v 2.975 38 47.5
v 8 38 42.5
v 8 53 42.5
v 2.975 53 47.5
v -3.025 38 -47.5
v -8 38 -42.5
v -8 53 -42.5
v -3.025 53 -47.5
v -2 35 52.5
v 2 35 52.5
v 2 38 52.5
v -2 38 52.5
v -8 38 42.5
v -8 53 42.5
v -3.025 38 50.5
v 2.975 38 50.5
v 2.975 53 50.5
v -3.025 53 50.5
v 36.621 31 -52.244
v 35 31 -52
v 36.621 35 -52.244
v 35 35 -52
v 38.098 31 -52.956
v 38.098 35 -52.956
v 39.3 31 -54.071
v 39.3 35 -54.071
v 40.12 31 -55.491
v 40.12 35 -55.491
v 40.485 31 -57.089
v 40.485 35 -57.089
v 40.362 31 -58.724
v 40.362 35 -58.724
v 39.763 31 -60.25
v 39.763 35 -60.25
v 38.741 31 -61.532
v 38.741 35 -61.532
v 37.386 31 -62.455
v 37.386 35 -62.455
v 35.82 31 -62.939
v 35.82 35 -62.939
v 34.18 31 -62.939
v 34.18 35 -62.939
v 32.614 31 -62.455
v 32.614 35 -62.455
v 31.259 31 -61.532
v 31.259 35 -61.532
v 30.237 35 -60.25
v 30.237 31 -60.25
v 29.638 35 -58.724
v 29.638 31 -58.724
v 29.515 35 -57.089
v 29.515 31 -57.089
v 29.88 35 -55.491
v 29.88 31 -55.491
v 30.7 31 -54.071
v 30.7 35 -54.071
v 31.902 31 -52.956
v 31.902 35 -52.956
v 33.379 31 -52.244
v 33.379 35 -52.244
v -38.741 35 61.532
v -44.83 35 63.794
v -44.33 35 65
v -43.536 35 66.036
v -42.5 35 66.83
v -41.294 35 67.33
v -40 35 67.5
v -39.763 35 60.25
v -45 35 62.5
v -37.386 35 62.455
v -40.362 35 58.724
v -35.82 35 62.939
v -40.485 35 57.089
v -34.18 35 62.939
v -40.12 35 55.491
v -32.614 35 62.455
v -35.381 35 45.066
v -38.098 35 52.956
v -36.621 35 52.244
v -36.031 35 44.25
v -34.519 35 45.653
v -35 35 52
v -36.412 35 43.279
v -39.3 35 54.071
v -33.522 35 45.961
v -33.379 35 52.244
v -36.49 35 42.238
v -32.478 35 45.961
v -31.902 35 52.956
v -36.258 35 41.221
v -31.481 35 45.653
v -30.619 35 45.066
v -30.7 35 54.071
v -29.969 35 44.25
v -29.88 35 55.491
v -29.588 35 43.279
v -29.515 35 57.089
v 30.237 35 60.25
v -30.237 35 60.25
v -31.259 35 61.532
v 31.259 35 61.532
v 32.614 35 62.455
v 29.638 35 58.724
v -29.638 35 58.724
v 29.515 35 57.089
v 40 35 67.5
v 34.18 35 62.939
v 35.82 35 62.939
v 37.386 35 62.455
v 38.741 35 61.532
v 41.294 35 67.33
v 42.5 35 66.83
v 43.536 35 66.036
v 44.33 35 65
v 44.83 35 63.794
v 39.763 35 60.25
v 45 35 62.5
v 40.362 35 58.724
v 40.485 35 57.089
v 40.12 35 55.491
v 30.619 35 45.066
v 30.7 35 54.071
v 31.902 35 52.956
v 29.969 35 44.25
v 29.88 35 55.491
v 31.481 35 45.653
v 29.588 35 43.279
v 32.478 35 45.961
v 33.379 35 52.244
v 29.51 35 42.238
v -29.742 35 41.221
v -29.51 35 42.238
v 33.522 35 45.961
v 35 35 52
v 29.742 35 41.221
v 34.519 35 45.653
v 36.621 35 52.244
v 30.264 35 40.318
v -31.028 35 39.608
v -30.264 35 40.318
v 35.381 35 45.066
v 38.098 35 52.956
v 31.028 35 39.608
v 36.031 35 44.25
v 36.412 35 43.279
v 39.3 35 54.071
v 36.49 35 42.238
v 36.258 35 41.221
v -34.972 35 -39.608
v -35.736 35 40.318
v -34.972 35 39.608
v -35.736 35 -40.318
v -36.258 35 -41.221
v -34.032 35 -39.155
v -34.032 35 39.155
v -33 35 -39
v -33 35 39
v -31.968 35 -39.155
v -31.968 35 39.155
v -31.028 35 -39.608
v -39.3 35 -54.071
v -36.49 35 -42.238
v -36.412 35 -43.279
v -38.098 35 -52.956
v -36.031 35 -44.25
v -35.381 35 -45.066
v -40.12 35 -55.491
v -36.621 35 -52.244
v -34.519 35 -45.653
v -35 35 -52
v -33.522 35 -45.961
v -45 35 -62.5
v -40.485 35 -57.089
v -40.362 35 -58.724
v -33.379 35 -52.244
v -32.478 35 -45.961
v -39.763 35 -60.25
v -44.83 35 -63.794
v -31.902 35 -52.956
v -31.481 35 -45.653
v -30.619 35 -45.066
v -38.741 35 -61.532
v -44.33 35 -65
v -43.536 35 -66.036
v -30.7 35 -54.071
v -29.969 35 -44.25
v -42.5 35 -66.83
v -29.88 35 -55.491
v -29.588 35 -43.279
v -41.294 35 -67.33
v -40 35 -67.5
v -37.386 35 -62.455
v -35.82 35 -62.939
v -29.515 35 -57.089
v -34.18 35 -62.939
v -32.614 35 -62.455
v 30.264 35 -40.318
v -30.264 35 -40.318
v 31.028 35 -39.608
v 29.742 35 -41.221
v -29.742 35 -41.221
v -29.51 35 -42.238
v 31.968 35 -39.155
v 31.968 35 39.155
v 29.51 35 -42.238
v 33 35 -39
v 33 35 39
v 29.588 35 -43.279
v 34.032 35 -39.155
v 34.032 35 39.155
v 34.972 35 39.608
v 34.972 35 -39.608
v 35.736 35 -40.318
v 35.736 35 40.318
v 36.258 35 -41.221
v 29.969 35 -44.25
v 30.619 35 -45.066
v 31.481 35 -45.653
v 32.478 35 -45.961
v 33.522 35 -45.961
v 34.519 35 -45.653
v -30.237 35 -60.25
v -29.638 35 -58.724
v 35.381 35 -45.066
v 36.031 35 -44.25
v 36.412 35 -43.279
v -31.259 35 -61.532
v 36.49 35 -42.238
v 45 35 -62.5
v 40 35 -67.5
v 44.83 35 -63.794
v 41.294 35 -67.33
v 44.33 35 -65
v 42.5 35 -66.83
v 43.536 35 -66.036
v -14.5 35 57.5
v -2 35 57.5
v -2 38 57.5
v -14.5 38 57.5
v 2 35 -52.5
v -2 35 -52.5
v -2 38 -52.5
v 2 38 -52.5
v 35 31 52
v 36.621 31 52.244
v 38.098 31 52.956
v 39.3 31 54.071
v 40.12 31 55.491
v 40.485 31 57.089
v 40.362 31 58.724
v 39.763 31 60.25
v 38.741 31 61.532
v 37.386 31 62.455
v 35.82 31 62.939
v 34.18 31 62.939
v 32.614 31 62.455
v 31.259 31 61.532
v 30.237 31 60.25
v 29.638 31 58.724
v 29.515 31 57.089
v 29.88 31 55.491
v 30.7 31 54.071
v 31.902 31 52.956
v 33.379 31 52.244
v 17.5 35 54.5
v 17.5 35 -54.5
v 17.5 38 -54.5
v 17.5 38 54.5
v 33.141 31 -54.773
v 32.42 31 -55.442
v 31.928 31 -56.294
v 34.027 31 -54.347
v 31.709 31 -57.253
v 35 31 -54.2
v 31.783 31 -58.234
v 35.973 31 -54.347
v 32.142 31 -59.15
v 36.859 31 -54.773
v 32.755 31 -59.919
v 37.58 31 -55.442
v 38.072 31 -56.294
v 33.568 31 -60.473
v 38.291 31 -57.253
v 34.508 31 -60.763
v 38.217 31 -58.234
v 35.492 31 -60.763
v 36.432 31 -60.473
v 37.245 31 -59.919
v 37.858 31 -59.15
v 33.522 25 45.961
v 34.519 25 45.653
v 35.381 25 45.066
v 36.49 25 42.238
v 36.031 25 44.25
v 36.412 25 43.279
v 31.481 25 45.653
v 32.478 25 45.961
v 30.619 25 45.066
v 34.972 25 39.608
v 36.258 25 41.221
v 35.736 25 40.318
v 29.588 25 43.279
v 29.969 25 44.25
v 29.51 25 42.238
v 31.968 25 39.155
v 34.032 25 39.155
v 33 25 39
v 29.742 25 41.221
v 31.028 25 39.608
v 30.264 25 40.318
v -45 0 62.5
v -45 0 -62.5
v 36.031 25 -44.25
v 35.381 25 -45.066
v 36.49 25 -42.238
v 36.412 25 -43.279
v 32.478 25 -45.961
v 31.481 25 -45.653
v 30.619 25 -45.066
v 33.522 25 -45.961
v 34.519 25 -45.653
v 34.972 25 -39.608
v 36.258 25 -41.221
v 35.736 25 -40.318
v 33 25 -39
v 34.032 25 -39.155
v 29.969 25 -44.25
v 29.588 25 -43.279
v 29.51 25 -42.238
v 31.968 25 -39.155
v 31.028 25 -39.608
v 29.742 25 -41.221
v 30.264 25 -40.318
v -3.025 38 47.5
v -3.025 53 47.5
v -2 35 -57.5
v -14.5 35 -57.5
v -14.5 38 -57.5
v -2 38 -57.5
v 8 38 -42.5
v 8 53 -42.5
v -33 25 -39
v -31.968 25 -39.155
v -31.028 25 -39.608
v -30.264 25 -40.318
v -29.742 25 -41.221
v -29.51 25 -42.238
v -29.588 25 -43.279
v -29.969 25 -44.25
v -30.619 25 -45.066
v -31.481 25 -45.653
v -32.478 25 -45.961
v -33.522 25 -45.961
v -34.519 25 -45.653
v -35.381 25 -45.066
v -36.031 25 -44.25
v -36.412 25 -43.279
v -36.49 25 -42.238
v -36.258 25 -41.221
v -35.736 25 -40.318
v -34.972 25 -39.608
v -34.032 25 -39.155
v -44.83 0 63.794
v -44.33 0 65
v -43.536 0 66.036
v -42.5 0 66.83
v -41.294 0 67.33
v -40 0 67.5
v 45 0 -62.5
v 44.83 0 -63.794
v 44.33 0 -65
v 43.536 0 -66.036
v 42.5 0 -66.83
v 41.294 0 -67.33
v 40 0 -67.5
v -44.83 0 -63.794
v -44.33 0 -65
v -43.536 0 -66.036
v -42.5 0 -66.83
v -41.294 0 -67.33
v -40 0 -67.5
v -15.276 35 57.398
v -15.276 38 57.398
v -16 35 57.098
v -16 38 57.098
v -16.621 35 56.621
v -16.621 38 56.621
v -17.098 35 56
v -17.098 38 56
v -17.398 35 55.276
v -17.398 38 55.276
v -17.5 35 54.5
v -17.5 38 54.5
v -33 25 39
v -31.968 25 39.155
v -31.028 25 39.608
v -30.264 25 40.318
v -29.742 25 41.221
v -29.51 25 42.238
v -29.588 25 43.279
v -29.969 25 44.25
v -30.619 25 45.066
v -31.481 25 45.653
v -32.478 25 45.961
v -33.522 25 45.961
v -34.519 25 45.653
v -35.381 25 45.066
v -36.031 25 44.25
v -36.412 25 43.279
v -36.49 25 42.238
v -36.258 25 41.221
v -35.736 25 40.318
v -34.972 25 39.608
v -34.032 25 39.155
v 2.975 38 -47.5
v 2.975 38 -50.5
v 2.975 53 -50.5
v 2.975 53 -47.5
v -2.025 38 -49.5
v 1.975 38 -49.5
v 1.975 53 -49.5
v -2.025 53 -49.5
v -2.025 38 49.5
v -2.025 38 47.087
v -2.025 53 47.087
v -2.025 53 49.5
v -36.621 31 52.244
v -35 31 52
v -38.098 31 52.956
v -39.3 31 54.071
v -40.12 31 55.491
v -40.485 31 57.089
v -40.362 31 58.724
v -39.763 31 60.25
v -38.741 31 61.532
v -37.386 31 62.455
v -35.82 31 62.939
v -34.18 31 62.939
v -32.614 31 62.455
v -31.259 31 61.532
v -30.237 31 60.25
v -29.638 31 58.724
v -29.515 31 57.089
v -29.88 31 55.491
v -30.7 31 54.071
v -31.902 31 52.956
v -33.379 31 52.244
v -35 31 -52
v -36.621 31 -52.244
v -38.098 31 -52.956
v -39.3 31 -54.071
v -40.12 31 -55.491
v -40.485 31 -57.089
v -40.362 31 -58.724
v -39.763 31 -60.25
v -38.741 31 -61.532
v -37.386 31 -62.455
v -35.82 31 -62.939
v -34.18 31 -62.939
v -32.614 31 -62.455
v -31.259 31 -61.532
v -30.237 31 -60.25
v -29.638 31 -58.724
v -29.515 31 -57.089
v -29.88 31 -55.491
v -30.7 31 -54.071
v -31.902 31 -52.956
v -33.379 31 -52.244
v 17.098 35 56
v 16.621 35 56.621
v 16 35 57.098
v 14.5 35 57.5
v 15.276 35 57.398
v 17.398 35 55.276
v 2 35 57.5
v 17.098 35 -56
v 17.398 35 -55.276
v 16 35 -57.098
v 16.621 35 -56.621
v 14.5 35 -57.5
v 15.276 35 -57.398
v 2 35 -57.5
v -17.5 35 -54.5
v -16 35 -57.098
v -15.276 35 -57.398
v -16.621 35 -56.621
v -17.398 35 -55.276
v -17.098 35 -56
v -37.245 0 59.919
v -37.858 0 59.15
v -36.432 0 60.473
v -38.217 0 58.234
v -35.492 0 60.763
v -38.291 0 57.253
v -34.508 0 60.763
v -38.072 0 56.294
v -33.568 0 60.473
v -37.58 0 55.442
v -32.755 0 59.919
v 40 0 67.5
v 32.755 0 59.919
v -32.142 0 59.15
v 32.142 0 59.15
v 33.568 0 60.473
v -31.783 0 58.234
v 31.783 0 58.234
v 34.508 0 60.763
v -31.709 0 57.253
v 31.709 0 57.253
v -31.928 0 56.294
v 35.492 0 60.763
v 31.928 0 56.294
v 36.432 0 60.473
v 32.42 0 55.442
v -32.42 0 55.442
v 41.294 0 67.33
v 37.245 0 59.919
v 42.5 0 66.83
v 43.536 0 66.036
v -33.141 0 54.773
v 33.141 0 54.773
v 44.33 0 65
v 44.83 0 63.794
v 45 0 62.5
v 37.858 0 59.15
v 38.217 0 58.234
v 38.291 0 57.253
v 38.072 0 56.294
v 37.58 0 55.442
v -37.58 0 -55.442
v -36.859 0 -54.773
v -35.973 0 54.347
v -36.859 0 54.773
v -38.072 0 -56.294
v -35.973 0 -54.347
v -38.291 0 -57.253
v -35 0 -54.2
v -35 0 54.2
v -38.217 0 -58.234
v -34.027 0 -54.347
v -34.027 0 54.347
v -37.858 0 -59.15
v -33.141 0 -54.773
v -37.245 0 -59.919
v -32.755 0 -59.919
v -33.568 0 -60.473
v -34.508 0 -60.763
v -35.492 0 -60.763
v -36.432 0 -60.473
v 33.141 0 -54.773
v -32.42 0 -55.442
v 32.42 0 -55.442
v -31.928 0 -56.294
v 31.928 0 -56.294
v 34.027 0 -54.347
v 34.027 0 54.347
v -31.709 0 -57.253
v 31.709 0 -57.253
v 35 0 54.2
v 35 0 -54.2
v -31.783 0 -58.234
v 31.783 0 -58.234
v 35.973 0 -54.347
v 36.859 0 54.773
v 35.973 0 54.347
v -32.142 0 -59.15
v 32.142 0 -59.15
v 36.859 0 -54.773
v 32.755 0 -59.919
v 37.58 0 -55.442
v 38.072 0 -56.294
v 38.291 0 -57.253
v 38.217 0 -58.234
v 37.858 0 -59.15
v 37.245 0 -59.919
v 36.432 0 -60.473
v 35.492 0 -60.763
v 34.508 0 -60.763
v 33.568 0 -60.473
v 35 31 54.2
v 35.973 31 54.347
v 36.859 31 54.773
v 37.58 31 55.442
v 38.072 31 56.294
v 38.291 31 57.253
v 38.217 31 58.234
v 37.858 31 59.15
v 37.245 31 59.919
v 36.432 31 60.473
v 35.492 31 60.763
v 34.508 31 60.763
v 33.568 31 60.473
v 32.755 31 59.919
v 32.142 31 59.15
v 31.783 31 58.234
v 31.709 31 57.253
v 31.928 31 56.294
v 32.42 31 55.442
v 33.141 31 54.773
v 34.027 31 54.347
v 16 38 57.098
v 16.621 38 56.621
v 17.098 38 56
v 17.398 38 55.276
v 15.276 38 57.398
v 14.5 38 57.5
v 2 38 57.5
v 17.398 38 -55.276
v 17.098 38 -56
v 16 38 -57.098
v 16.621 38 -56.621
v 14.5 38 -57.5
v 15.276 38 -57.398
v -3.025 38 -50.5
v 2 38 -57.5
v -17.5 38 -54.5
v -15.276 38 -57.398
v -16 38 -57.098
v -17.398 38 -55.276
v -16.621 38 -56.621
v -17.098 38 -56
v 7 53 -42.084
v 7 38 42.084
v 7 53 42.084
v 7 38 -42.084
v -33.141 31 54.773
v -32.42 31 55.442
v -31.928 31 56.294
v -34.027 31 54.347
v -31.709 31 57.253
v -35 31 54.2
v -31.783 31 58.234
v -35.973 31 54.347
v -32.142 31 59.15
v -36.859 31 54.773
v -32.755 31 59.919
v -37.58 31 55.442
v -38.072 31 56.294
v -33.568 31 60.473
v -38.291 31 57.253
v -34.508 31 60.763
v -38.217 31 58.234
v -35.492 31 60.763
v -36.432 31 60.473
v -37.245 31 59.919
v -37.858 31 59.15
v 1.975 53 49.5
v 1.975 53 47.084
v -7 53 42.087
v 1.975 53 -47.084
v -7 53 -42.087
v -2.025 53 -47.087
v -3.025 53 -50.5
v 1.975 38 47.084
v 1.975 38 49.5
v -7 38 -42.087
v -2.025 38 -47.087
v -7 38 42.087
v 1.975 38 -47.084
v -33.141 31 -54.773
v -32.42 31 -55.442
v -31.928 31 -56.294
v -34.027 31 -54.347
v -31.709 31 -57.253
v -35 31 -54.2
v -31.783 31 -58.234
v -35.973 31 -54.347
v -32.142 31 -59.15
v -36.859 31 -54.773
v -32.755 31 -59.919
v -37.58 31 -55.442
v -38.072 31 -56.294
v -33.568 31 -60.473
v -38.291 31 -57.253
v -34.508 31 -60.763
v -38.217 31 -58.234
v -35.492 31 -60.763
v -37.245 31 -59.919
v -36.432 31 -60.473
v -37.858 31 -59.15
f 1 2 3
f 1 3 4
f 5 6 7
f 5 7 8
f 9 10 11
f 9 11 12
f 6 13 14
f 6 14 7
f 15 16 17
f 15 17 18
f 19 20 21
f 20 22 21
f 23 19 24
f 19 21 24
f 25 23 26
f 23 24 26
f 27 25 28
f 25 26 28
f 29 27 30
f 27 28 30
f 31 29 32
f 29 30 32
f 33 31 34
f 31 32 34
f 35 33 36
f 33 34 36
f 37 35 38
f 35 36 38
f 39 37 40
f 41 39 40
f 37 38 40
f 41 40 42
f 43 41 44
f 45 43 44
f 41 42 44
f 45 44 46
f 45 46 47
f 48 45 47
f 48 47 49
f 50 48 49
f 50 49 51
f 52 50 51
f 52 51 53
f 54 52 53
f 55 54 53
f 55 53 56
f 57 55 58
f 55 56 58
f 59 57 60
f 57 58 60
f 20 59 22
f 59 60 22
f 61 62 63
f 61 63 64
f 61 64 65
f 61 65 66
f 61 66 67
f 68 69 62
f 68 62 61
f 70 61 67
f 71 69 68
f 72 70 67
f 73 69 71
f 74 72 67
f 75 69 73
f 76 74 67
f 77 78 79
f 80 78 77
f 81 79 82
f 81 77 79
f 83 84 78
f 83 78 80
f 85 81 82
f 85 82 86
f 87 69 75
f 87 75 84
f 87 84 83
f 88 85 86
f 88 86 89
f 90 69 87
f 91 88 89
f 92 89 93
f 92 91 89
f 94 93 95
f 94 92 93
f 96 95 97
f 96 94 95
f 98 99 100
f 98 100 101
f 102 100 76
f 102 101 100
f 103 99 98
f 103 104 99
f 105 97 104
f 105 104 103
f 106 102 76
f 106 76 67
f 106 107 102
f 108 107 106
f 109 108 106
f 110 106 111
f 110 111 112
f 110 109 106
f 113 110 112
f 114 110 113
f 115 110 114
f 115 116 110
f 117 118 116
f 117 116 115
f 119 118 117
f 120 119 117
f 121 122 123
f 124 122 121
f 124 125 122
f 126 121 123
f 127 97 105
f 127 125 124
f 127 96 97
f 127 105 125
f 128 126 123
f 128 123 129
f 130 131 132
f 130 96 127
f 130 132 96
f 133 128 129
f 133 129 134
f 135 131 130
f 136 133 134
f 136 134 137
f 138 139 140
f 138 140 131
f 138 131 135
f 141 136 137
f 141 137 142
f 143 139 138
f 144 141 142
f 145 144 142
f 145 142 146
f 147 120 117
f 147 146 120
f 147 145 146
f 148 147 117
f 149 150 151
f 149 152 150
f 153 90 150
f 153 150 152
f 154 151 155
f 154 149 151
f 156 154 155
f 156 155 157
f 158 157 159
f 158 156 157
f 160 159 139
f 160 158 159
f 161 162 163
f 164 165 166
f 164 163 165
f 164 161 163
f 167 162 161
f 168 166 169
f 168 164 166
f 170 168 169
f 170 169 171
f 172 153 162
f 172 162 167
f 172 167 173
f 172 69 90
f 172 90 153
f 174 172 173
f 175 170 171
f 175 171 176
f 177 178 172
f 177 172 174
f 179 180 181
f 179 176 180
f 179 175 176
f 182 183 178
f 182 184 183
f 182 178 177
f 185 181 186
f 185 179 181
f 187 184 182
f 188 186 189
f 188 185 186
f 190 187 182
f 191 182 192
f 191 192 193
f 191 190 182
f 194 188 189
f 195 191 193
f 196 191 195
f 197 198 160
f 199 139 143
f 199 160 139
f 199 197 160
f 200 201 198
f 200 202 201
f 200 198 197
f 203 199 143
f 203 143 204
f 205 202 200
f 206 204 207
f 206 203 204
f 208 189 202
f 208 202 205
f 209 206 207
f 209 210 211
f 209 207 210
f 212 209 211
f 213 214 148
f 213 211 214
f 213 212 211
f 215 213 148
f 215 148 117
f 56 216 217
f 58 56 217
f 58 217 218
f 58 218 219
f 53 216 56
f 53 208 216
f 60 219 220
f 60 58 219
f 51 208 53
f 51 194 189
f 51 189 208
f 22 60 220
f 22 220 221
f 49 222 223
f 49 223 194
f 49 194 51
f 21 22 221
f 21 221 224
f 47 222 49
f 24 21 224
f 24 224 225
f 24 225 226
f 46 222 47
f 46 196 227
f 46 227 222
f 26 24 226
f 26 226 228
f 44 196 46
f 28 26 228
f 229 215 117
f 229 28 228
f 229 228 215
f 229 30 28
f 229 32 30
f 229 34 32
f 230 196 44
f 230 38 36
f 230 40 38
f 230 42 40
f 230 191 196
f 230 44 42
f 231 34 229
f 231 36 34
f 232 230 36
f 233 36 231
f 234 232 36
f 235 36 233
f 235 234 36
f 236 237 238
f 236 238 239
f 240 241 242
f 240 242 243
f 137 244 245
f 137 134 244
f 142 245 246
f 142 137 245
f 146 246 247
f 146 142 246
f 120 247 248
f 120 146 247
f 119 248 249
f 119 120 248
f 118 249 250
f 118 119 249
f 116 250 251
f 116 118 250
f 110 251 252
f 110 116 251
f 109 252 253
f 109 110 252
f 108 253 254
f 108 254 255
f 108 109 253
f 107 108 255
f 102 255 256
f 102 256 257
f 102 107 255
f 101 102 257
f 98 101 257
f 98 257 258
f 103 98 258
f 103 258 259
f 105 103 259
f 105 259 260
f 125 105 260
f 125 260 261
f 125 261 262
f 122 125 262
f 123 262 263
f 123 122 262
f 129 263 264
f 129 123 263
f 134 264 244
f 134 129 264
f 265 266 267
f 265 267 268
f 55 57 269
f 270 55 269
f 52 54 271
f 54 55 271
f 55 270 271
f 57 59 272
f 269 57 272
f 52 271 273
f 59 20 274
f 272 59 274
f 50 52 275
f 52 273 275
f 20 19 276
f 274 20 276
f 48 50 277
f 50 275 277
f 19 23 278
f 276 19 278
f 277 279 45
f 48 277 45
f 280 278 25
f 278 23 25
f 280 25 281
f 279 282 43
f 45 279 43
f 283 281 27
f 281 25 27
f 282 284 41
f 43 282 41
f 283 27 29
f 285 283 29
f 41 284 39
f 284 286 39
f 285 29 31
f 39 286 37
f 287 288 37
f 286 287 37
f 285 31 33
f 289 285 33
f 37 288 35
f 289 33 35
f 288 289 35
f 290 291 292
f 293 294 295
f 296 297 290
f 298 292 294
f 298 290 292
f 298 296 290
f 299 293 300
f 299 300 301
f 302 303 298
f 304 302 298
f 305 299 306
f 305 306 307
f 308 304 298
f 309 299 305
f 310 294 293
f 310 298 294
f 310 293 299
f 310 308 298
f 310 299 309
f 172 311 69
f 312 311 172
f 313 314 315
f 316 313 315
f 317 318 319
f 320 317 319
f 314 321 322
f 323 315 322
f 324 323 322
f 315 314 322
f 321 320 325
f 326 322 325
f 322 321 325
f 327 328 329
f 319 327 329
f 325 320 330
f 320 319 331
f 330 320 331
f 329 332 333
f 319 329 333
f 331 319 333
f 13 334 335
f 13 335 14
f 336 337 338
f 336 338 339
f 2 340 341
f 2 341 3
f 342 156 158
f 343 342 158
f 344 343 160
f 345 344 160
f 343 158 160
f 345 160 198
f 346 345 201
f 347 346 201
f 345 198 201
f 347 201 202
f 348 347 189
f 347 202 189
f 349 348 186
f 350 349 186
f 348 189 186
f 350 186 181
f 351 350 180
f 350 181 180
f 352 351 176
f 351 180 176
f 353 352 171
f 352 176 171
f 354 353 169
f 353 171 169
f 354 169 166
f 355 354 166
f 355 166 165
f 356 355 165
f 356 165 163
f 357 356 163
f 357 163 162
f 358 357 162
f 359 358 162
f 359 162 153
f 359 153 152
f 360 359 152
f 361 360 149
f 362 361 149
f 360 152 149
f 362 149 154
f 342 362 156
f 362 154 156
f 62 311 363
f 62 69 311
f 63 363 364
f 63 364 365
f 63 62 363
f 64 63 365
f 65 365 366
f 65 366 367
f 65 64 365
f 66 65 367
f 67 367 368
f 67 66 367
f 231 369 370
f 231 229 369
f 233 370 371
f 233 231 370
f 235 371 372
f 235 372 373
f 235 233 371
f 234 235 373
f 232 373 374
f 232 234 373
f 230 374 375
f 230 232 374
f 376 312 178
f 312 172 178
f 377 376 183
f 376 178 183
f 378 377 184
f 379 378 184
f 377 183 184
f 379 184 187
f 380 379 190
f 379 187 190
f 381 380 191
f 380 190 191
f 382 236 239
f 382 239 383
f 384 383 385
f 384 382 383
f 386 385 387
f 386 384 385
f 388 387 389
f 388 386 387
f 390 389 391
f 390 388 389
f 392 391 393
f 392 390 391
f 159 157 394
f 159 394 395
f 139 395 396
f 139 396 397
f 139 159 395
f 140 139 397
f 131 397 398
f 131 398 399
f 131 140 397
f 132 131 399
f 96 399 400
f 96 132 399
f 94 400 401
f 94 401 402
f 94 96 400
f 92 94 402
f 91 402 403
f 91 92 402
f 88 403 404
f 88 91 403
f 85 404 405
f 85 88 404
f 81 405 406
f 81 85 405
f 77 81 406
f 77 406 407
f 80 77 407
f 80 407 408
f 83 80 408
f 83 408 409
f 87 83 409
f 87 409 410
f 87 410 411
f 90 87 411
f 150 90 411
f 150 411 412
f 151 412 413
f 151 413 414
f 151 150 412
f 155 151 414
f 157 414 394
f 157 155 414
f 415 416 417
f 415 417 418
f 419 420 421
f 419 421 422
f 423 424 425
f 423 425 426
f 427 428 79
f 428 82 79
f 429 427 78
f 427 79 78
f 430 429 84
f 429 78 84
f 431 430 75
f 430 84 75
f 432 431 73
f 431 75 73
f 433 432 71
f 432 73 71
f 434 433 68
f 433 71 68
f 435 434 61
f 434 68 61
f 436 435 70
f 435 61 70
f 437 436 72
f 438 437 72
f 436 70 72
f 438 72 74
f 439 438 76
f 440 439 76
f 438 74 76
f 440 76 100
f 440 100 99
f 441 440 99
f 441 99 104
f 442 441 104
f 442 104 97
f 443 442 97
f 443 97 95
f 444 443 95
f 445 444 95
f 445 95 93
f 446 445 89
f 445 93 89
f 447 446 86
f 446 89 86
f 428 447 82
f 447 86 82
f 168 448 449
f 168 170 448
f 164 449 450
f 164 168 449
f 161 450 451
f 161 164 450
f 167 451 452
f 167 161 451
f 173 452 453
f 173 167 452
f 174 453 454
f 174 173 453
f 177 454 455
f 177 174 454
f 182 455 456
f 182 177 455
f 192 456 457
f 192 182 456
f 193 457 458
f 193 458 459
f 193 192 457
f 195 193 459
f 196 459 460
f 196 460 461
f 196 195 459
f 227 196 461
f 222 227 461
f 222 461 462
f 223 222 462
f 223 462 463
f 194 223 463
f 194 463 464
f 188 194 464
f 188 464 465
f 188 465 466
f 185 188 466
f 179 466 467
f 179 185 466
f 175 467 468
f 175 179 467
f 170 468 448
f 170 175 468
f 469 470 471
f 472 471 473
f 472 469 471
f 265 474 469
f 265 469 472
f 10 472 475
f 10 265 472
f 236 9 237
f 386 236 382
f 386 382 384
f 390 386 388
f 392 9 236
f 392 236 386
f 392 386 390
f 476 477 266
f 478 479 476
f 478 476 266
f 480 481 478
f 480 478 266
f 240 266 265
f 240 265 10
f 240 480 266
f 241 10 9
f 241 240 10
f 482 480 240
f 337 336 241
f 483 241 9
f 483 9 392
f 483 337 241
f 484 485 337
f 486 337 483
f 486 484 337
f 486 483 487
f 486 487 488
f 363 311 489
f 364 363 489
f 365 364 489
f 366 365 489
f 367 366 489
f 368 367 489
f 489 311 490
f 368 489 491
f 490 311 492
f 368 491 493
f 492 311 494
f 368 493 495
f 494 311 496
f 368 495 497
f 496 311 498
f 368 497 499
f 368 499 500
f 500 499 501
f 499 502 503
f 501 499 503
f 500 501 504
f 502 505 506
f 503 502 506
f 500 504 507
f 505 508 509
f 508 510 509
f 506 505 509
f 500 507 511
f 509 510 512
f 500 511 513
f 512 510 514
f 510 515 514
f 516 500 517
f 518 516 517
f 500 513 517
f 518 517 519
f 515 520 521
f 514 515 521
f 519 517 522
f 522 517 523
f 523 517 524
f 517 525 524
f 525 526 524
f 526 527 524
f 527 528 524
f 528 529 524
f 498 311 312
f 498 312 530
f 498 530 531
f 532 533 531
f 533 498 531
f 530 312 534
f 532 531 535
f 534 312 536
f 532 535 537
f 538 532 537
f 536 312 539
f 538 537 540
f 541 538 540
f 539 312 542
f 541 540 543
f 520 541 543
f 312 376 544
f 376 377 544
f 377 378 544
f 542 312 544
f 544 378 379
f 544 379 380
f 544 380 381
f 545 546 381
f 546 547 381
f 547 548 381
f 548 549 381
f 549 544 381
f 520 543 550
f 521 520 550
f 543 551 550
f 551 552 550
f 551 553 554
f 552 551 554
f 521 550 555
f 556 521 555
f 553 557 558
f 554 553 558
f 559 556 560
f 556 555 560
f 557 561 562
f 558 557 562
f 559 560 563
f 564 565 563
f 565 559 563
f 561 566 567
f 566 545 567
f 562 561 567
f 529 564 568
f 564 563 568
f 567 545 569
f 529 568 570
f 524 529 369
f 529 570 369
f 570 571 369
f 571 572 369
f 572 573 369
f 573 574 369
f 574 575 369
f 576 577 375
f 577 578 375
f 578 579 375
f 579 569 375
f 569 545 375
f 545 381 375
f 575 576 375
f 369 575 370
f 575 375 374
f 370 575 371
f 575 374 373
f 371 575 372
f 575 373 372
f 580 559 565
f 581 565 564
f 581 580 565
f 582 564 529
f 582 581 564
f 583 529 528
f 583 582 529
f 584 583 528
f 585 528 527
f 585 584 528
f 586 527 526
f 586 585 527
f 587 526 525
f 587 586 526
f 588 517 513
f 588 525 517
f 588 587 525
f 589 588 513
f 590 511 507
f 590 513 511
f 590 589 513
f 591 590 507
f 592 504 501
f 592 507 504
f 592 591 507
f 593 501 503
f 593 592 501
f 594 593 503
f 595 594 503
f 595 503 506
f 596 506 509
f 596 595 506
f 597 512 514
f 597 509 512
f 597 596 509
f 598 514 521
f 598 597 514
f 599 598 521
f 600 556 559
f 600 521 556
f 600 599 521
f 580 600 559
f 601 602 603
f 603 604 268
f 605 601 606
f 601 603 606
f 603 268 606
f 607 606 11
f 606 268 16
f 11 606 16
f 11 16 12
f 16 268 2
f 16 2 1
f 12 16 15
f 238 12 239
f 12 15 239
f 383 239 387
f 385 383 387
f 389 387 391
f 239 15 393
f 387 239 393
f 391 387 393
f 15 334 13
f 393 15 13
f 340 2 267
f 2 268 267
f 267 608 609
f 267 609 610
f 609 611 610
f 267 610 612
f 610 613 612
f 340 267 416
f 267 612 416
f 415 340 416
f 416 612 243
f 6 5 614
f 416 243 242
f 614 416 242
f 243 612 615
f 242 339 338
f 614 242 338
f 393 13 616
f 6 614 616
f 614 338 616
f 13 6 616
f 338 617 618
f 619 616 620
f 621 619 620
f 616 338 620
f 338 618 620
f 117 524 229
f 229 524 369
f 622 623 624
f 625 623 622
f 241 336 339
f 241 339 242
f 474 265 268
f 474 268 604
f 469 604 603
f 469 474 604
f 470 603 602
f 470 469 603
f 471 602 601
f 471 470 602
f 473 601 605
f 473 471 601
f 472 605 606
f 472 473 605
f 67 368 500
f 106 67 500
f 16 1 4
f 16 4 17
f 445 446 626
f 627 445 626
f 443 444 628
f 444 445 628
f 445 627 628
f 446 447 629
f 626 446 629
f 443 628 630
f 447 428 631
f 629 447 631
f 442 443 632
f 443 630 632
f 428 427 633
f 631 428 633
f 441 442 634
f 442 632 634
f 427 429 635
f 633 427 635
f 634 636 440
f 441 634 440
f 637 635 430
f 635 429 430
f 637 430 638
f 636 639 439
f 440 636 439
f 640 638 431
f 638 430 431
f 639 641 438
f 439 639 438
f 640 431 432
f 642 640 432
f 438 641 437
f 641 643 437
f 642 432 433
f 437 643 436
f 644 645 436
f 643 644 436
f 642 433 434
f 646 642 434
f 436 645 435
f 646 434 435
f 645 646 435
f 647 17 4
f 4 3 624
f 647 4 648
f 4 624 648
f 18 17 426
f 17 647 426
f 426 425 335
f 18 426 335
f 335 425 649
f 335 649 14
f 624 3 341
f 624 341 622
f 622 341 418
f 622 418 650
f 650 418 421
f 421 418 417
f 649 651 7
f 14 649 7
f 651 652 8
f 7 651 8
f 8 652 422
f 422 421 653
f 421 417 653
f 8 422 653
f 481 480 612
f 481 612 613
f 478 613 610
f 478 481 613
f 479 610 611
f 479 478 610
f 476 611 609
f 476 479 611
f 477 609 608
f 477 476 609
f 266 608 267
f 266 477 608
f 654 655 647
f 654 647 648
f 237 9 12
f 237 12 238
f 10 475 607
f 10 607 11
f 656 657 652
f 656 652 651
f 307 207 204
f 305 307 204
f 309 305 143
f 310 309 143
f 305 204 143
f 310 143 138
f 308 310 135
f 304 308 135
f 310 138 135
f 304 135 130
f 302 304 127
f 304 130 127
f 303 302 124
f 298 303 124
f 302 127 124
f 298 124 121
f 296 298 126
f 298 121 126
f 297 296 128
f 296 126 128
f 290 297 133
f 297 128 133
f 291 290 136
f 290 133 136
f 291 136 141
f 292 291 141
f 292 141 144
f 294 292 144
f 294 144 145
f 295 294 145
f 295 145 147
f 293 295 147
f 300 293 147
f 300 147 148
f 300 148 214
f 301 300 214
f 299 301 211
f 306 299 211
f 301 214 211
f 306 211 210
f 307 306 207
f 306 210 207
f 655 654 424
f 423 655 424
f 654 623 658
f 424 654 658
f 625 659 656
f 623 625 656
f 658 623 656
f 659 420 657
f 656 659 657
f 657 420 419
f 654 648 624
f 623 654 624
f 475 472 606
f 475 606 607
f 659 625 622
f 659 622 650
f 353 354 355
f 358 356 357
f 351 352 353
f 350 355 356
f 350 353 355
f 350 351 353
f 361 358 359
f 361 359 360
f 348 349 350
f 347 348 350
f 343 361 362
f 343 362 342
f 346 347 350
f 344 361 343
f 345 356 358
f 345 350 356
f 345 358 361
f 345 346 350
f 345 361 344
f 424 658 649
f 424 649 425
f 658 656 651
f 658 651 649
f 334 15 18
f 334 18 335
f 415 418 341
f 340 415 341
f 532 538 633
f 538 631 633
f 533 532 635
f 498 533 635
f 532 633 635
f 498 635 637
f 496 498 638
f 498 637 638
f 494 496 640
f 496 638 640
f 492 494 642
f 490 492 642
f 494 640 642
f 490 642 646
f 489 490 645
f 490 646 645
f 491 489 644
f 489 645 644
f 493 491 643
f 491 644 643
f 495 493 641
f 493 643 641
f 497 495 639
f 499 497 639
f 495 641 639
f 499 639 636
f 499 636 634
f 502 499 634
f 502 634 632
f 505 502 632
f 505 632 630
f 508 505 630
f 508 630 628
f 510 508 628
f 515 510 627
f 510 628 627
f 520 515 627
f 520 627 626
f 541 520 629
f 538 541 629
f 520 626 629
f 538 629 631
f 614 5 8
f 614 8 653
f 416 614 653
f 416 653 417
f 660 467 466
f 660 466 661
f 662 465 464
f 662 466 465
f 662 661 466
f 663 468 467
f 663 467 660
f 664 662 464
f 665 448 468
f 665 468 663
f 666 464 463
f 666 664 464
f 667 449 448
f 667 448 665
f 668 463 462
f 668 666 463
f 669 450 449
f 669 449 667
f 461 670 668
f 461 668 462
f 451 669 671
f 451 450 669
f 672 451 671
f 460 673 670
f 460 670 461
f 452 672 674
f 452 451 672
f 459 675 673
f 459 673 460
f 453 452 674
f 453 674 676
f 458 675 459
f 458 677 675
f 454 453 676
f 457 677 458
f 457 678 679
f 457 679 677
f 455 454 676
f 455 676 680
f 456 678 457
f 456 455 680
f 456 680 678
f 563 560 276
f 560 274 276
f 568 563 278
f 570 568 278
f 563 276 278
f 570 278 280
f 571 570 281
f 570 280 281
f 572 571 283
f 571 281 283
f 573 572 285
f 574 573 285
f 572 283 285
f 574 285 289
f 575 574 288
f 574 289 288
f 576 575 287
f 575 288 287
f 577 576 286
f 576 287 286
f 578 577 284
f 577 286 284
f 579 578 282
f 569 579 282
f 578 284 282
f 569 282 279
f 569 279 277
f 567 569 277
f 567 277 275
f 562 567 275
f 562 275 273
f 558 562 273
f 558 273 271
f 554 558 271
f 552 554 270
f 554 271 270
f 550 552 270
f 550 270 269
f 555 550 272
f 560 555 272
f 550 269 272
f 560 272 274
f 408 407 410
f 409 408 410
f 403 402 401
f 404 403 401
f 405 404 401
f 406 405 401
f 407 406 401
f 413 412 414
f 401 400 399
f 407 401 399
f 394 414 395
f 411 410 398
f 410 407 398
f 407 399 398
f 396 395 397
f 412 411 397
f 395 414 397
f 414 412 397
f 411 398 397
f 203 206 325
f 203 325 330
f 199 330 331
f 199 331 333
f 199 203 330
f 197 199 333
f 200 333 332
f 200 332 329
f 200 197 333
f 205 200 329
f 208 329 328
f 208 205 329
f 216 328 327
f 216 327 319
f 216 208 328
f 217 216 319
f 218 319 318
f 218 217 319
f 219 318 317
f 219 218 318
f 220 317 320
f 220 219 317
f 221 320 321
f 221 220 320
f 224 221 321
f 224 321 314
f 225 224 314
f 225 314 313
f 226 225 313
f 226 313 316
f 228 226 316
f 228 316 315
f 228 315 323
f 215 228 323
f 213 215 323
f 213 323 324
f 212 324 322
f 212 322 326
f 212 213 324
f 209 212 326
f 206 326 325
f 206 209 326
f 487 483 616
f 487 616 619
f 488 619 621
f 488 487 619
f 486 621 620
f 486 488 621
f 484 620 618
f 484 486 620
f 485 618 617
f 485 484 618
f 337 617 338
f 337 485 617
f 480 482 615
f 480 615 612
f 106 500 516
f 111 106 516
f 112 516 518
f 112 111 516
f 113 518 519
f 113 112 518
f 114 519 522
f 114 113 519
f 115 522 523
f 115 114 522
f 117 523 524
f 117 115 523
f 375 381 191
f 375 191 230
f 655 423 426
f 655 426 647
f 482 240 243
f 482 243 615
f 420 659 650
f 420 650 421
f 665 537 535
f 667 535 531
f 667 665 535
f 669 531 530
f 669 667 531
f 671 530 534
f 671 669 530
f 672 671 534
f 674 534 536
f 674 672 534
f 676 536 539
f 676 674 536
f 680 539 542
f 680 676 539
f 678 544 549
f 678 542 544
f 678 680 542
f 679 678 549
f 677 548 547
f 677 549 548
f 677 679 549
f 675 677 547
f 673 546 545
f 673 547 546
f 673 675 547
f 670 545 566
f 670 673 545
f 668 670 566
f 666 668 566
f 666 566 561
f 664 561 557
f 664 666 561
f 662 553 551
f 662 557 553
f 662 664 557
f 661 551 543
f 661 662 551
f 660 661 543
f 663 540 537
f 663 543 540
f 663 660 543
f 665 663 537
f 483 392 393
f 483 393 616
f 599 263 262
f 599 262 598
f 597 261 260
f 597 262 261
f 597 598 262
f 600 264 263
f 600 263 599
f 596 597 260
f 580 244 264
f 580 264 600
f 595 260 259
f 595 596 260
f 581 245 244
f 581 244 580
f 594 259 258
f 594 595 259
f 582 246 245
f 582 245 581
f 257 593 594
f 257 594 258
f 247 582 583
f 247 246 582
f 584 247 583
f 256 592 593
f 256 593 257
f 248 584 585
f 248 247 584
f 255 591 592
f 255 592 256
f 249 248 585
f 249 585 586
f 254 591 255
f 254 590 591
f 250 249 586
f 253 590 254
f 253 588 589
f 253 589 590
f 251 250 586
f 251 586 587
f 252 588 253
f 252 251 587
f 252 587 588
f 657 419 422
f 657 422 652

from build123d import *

# Parameters (mm, degrees)
SKETCH2_W               = 90
SKETCH2_H               = 135
BOSS_EXTRUDE1_DEPTH     = 35
FILLET1_R               = 5
SKETCH8_R               = 3.5
CUT_EXTRUDE1_DEPTH      = 10
MIRROR2_COPY_2_SKETCH_R = 3.5
MIRROR2_COPY_2_DEPTH    = 10
BOSS_EXTRUDE2_DEPTH     = 3
BOSS_EXTRUDE3_DEPTH     = 15


with BuildPart() as part:
    # Sketch2 → Boss-Extrude1 (new body)
    with BuildSketch(Plane(origin=(0, 0, 0), x_dir=(1, 0, 0), z_dir=(0, 1, 0))):
        Rectangle(SKETCH2_W, SKETCH2_H)
    extrude(amount=BOSS_EXTRUDE1_DEPTH)

    # Fillet1
    fillet1_edges = [part.edges().sort_by_distance(p)[0] for p in [
        (-45, 17.5, -67.5),
        (45, 17.5, -67.5),
        (45, 17.5, 67.5),
        (-45, 17.5, 67.5),
    ]]
    fillet(fillet1_edges, radius=FILLET1_R)

    # Sketch6 → CBORE for M6 Hex Head Bolt1 (revolve, cut)
    with BuildSketch(Plane(origin=(-35, 35, -57.5), x_dir=(0, 0, 1), z_dir=(1, 0, 0))):
        Polygon((0, 0), (0, 43.982840043), (3.3, 42), (3.3, 4), (5.5, 4), (5.5, 0), align=None)
    cbore_for_m6_hex_head_bolt1 = revolve(axis=Axis((-35, 41.35, -57.5), (0, -1, 0)), mode=Mode.SUBTRACT)

    # Sketch8 → Cut-Extrude1 (cut)
    with BuildSketch(Plane(origin=(0, 35, 0), x_dir=(1, 0, 0), z_dir=(0, 1, 0))):
        with Locations(Location((-33, 42.5, 0), (0, 0, 270))):
            Circle(SKETCH8_R)
    cut_extrude1 = extrude(amount=-CUT_EXTRUDE1_DEPTH, mode=Mode.SUBTRACT)

    # Mirror1: CBORE for M6 Hex Head Bolt1, Cut-Extrude1 across plane
    add(cbore_for_m6_hex_head_bolt1.mirror(Plane(origin=(0, 0, 0), x_dir=(0, 0, 1), z_dir=(1, 0, 0))), mode=Mode.SUBTRACT)
    add(cut_extrude1.mirror(Plane(origin=(0, 0, 0), x_dir=(0, 0, 1), z_dir=(1, 0, 0))), mode=Mode.SUBTRACT)

    # Mirror2: CBORE for M6 Hex Head Bolt1, Cut-Extrude1 across plane
    add(cbore_for_m6_hex_head_bolt1.mirror(Plane.XY), mode=Mode.SUBTRACT)
    add(cut_extrude1.mirror(Plane.XY), mode=Mode.SUBTRACT)

    # Mirror2 copy 1 sketch → Mirror2 copy 1 (revolve, cut)
    with BuildSketch(Plane(origin=(35, 35, 57.5), x_dir=(0, 0, -1), z_dir=(-1, 0, 0))):
        Polygon((0, 0), (0, 43.982840043), (3.3, 42), (3.3, 4), (5.5, 4), (5.5, 0), align=None)
    revolve(axis=Axis((35, 41.35, 57.5), (0, -1, 0)), mode=Mode.SUBTRACT)

    # Mirror2 copy 2 sketch → Mirror2 copy 2 (cut)
    with BuildSketch(Plane(origin=(0, 35, 0), x_dir=(-1, 0, 0), z_dir=(0, 1, 0))):
        with Locations(Location((-33, 42.5, 0), (0, 0, 270))):
            Circle(MIRROR2_COPY_2_SKETCH_R)
    extrude(amount=-MIRROR2_COPY_2_DEPTH, mode=Mode.SUBTRACT)


with BuildPart() as body_2:
    # Sketch9 → Boss-Extrude2 (new body)
    with BuildSketch(Plane(origin=(0, 35, 0), x_dir=(1, 0, 0), z_dir=(0, 1, 0))):
        with BuildLine():
            Line((14.5, -57.5), (2, -57.5))
            Line((2, -57.5), (2, -52.5))
            Line((2, -52.5), (-2, -52.5))
            Line((-2, -52.5), (-2, -57.5))
            Line((-2, -57.5), (-14.5, -57.5))
            ThreePointArc((-14.5, -57.5), (-16.621320344, -56.621320344), (-17.5, -54.5))
            Line((-17.5, -54.5), (-17.5, 54.5))
            ThreePointArc((-17.5, 54.5), (-16.621320344, 56.621320344), (-14.5, 57.5))
            Line((-14.5, 57.5), (-2, 57.5))
            Line((-2, 57.5), (-2, 52.5))
            Line((-2, 52.5), (2, 52.5))
            Line((2, 52.5), (2, 57.5))
            Line((2, 57.5), (14.5, 57.5))
            ThreePointArc((14.5, 57.5), (16.621320344, 56.621320344), (17.5, 54.5))
            Line((17.5, 54.5), (17.5, -54.5))
            ThreePointArc((17.5, -54.5), (16.621320344, -56.621320344), (14.5, -57.5))
        make_face()
    extrude(amount=BOSS_EXTRUDE2_DEPTH)

    # Sketch10 → Boss-Extrude3 (add)
    with BuildSketch(Plane(origin=(0, 38, 0), x_dir=(1, 0, 0), z_dir=(0, 1, 0))):
        Polygon((2.975253238, 47.5), (8, 42.5), (8, -42.5), (2.975253238, -47.5), (2.975253238, -50.5), (-3.024746762, -50.5), (-3.024746762, -47.5), (-8, -42.5), (-8, 42.5), (-3.024746762, 47.5), (-3.024746762, 50.5), (2.975253238, 50.5), align=None)
        Polygon((7, -42.084339647), (7, 42.084339647), (1.975253238, 47.084339647), (1.975253238, 49.5), (-2.024746762, 49.5), (-2.024746762, 47.087238917), (-7, 42.087238917), (-7, -42.087238917), (-2.024746762, -47.087238917), (-2.024746762, -49.5), (1.975253238, -49.5), (1.975253238, -47.084339647), align=None, mode=Mode.SUBTRACT)
    extrude(amount=BOSS_EXTRUDE3_DEPTH)


solid = Compound([part.part, body_2.part])
